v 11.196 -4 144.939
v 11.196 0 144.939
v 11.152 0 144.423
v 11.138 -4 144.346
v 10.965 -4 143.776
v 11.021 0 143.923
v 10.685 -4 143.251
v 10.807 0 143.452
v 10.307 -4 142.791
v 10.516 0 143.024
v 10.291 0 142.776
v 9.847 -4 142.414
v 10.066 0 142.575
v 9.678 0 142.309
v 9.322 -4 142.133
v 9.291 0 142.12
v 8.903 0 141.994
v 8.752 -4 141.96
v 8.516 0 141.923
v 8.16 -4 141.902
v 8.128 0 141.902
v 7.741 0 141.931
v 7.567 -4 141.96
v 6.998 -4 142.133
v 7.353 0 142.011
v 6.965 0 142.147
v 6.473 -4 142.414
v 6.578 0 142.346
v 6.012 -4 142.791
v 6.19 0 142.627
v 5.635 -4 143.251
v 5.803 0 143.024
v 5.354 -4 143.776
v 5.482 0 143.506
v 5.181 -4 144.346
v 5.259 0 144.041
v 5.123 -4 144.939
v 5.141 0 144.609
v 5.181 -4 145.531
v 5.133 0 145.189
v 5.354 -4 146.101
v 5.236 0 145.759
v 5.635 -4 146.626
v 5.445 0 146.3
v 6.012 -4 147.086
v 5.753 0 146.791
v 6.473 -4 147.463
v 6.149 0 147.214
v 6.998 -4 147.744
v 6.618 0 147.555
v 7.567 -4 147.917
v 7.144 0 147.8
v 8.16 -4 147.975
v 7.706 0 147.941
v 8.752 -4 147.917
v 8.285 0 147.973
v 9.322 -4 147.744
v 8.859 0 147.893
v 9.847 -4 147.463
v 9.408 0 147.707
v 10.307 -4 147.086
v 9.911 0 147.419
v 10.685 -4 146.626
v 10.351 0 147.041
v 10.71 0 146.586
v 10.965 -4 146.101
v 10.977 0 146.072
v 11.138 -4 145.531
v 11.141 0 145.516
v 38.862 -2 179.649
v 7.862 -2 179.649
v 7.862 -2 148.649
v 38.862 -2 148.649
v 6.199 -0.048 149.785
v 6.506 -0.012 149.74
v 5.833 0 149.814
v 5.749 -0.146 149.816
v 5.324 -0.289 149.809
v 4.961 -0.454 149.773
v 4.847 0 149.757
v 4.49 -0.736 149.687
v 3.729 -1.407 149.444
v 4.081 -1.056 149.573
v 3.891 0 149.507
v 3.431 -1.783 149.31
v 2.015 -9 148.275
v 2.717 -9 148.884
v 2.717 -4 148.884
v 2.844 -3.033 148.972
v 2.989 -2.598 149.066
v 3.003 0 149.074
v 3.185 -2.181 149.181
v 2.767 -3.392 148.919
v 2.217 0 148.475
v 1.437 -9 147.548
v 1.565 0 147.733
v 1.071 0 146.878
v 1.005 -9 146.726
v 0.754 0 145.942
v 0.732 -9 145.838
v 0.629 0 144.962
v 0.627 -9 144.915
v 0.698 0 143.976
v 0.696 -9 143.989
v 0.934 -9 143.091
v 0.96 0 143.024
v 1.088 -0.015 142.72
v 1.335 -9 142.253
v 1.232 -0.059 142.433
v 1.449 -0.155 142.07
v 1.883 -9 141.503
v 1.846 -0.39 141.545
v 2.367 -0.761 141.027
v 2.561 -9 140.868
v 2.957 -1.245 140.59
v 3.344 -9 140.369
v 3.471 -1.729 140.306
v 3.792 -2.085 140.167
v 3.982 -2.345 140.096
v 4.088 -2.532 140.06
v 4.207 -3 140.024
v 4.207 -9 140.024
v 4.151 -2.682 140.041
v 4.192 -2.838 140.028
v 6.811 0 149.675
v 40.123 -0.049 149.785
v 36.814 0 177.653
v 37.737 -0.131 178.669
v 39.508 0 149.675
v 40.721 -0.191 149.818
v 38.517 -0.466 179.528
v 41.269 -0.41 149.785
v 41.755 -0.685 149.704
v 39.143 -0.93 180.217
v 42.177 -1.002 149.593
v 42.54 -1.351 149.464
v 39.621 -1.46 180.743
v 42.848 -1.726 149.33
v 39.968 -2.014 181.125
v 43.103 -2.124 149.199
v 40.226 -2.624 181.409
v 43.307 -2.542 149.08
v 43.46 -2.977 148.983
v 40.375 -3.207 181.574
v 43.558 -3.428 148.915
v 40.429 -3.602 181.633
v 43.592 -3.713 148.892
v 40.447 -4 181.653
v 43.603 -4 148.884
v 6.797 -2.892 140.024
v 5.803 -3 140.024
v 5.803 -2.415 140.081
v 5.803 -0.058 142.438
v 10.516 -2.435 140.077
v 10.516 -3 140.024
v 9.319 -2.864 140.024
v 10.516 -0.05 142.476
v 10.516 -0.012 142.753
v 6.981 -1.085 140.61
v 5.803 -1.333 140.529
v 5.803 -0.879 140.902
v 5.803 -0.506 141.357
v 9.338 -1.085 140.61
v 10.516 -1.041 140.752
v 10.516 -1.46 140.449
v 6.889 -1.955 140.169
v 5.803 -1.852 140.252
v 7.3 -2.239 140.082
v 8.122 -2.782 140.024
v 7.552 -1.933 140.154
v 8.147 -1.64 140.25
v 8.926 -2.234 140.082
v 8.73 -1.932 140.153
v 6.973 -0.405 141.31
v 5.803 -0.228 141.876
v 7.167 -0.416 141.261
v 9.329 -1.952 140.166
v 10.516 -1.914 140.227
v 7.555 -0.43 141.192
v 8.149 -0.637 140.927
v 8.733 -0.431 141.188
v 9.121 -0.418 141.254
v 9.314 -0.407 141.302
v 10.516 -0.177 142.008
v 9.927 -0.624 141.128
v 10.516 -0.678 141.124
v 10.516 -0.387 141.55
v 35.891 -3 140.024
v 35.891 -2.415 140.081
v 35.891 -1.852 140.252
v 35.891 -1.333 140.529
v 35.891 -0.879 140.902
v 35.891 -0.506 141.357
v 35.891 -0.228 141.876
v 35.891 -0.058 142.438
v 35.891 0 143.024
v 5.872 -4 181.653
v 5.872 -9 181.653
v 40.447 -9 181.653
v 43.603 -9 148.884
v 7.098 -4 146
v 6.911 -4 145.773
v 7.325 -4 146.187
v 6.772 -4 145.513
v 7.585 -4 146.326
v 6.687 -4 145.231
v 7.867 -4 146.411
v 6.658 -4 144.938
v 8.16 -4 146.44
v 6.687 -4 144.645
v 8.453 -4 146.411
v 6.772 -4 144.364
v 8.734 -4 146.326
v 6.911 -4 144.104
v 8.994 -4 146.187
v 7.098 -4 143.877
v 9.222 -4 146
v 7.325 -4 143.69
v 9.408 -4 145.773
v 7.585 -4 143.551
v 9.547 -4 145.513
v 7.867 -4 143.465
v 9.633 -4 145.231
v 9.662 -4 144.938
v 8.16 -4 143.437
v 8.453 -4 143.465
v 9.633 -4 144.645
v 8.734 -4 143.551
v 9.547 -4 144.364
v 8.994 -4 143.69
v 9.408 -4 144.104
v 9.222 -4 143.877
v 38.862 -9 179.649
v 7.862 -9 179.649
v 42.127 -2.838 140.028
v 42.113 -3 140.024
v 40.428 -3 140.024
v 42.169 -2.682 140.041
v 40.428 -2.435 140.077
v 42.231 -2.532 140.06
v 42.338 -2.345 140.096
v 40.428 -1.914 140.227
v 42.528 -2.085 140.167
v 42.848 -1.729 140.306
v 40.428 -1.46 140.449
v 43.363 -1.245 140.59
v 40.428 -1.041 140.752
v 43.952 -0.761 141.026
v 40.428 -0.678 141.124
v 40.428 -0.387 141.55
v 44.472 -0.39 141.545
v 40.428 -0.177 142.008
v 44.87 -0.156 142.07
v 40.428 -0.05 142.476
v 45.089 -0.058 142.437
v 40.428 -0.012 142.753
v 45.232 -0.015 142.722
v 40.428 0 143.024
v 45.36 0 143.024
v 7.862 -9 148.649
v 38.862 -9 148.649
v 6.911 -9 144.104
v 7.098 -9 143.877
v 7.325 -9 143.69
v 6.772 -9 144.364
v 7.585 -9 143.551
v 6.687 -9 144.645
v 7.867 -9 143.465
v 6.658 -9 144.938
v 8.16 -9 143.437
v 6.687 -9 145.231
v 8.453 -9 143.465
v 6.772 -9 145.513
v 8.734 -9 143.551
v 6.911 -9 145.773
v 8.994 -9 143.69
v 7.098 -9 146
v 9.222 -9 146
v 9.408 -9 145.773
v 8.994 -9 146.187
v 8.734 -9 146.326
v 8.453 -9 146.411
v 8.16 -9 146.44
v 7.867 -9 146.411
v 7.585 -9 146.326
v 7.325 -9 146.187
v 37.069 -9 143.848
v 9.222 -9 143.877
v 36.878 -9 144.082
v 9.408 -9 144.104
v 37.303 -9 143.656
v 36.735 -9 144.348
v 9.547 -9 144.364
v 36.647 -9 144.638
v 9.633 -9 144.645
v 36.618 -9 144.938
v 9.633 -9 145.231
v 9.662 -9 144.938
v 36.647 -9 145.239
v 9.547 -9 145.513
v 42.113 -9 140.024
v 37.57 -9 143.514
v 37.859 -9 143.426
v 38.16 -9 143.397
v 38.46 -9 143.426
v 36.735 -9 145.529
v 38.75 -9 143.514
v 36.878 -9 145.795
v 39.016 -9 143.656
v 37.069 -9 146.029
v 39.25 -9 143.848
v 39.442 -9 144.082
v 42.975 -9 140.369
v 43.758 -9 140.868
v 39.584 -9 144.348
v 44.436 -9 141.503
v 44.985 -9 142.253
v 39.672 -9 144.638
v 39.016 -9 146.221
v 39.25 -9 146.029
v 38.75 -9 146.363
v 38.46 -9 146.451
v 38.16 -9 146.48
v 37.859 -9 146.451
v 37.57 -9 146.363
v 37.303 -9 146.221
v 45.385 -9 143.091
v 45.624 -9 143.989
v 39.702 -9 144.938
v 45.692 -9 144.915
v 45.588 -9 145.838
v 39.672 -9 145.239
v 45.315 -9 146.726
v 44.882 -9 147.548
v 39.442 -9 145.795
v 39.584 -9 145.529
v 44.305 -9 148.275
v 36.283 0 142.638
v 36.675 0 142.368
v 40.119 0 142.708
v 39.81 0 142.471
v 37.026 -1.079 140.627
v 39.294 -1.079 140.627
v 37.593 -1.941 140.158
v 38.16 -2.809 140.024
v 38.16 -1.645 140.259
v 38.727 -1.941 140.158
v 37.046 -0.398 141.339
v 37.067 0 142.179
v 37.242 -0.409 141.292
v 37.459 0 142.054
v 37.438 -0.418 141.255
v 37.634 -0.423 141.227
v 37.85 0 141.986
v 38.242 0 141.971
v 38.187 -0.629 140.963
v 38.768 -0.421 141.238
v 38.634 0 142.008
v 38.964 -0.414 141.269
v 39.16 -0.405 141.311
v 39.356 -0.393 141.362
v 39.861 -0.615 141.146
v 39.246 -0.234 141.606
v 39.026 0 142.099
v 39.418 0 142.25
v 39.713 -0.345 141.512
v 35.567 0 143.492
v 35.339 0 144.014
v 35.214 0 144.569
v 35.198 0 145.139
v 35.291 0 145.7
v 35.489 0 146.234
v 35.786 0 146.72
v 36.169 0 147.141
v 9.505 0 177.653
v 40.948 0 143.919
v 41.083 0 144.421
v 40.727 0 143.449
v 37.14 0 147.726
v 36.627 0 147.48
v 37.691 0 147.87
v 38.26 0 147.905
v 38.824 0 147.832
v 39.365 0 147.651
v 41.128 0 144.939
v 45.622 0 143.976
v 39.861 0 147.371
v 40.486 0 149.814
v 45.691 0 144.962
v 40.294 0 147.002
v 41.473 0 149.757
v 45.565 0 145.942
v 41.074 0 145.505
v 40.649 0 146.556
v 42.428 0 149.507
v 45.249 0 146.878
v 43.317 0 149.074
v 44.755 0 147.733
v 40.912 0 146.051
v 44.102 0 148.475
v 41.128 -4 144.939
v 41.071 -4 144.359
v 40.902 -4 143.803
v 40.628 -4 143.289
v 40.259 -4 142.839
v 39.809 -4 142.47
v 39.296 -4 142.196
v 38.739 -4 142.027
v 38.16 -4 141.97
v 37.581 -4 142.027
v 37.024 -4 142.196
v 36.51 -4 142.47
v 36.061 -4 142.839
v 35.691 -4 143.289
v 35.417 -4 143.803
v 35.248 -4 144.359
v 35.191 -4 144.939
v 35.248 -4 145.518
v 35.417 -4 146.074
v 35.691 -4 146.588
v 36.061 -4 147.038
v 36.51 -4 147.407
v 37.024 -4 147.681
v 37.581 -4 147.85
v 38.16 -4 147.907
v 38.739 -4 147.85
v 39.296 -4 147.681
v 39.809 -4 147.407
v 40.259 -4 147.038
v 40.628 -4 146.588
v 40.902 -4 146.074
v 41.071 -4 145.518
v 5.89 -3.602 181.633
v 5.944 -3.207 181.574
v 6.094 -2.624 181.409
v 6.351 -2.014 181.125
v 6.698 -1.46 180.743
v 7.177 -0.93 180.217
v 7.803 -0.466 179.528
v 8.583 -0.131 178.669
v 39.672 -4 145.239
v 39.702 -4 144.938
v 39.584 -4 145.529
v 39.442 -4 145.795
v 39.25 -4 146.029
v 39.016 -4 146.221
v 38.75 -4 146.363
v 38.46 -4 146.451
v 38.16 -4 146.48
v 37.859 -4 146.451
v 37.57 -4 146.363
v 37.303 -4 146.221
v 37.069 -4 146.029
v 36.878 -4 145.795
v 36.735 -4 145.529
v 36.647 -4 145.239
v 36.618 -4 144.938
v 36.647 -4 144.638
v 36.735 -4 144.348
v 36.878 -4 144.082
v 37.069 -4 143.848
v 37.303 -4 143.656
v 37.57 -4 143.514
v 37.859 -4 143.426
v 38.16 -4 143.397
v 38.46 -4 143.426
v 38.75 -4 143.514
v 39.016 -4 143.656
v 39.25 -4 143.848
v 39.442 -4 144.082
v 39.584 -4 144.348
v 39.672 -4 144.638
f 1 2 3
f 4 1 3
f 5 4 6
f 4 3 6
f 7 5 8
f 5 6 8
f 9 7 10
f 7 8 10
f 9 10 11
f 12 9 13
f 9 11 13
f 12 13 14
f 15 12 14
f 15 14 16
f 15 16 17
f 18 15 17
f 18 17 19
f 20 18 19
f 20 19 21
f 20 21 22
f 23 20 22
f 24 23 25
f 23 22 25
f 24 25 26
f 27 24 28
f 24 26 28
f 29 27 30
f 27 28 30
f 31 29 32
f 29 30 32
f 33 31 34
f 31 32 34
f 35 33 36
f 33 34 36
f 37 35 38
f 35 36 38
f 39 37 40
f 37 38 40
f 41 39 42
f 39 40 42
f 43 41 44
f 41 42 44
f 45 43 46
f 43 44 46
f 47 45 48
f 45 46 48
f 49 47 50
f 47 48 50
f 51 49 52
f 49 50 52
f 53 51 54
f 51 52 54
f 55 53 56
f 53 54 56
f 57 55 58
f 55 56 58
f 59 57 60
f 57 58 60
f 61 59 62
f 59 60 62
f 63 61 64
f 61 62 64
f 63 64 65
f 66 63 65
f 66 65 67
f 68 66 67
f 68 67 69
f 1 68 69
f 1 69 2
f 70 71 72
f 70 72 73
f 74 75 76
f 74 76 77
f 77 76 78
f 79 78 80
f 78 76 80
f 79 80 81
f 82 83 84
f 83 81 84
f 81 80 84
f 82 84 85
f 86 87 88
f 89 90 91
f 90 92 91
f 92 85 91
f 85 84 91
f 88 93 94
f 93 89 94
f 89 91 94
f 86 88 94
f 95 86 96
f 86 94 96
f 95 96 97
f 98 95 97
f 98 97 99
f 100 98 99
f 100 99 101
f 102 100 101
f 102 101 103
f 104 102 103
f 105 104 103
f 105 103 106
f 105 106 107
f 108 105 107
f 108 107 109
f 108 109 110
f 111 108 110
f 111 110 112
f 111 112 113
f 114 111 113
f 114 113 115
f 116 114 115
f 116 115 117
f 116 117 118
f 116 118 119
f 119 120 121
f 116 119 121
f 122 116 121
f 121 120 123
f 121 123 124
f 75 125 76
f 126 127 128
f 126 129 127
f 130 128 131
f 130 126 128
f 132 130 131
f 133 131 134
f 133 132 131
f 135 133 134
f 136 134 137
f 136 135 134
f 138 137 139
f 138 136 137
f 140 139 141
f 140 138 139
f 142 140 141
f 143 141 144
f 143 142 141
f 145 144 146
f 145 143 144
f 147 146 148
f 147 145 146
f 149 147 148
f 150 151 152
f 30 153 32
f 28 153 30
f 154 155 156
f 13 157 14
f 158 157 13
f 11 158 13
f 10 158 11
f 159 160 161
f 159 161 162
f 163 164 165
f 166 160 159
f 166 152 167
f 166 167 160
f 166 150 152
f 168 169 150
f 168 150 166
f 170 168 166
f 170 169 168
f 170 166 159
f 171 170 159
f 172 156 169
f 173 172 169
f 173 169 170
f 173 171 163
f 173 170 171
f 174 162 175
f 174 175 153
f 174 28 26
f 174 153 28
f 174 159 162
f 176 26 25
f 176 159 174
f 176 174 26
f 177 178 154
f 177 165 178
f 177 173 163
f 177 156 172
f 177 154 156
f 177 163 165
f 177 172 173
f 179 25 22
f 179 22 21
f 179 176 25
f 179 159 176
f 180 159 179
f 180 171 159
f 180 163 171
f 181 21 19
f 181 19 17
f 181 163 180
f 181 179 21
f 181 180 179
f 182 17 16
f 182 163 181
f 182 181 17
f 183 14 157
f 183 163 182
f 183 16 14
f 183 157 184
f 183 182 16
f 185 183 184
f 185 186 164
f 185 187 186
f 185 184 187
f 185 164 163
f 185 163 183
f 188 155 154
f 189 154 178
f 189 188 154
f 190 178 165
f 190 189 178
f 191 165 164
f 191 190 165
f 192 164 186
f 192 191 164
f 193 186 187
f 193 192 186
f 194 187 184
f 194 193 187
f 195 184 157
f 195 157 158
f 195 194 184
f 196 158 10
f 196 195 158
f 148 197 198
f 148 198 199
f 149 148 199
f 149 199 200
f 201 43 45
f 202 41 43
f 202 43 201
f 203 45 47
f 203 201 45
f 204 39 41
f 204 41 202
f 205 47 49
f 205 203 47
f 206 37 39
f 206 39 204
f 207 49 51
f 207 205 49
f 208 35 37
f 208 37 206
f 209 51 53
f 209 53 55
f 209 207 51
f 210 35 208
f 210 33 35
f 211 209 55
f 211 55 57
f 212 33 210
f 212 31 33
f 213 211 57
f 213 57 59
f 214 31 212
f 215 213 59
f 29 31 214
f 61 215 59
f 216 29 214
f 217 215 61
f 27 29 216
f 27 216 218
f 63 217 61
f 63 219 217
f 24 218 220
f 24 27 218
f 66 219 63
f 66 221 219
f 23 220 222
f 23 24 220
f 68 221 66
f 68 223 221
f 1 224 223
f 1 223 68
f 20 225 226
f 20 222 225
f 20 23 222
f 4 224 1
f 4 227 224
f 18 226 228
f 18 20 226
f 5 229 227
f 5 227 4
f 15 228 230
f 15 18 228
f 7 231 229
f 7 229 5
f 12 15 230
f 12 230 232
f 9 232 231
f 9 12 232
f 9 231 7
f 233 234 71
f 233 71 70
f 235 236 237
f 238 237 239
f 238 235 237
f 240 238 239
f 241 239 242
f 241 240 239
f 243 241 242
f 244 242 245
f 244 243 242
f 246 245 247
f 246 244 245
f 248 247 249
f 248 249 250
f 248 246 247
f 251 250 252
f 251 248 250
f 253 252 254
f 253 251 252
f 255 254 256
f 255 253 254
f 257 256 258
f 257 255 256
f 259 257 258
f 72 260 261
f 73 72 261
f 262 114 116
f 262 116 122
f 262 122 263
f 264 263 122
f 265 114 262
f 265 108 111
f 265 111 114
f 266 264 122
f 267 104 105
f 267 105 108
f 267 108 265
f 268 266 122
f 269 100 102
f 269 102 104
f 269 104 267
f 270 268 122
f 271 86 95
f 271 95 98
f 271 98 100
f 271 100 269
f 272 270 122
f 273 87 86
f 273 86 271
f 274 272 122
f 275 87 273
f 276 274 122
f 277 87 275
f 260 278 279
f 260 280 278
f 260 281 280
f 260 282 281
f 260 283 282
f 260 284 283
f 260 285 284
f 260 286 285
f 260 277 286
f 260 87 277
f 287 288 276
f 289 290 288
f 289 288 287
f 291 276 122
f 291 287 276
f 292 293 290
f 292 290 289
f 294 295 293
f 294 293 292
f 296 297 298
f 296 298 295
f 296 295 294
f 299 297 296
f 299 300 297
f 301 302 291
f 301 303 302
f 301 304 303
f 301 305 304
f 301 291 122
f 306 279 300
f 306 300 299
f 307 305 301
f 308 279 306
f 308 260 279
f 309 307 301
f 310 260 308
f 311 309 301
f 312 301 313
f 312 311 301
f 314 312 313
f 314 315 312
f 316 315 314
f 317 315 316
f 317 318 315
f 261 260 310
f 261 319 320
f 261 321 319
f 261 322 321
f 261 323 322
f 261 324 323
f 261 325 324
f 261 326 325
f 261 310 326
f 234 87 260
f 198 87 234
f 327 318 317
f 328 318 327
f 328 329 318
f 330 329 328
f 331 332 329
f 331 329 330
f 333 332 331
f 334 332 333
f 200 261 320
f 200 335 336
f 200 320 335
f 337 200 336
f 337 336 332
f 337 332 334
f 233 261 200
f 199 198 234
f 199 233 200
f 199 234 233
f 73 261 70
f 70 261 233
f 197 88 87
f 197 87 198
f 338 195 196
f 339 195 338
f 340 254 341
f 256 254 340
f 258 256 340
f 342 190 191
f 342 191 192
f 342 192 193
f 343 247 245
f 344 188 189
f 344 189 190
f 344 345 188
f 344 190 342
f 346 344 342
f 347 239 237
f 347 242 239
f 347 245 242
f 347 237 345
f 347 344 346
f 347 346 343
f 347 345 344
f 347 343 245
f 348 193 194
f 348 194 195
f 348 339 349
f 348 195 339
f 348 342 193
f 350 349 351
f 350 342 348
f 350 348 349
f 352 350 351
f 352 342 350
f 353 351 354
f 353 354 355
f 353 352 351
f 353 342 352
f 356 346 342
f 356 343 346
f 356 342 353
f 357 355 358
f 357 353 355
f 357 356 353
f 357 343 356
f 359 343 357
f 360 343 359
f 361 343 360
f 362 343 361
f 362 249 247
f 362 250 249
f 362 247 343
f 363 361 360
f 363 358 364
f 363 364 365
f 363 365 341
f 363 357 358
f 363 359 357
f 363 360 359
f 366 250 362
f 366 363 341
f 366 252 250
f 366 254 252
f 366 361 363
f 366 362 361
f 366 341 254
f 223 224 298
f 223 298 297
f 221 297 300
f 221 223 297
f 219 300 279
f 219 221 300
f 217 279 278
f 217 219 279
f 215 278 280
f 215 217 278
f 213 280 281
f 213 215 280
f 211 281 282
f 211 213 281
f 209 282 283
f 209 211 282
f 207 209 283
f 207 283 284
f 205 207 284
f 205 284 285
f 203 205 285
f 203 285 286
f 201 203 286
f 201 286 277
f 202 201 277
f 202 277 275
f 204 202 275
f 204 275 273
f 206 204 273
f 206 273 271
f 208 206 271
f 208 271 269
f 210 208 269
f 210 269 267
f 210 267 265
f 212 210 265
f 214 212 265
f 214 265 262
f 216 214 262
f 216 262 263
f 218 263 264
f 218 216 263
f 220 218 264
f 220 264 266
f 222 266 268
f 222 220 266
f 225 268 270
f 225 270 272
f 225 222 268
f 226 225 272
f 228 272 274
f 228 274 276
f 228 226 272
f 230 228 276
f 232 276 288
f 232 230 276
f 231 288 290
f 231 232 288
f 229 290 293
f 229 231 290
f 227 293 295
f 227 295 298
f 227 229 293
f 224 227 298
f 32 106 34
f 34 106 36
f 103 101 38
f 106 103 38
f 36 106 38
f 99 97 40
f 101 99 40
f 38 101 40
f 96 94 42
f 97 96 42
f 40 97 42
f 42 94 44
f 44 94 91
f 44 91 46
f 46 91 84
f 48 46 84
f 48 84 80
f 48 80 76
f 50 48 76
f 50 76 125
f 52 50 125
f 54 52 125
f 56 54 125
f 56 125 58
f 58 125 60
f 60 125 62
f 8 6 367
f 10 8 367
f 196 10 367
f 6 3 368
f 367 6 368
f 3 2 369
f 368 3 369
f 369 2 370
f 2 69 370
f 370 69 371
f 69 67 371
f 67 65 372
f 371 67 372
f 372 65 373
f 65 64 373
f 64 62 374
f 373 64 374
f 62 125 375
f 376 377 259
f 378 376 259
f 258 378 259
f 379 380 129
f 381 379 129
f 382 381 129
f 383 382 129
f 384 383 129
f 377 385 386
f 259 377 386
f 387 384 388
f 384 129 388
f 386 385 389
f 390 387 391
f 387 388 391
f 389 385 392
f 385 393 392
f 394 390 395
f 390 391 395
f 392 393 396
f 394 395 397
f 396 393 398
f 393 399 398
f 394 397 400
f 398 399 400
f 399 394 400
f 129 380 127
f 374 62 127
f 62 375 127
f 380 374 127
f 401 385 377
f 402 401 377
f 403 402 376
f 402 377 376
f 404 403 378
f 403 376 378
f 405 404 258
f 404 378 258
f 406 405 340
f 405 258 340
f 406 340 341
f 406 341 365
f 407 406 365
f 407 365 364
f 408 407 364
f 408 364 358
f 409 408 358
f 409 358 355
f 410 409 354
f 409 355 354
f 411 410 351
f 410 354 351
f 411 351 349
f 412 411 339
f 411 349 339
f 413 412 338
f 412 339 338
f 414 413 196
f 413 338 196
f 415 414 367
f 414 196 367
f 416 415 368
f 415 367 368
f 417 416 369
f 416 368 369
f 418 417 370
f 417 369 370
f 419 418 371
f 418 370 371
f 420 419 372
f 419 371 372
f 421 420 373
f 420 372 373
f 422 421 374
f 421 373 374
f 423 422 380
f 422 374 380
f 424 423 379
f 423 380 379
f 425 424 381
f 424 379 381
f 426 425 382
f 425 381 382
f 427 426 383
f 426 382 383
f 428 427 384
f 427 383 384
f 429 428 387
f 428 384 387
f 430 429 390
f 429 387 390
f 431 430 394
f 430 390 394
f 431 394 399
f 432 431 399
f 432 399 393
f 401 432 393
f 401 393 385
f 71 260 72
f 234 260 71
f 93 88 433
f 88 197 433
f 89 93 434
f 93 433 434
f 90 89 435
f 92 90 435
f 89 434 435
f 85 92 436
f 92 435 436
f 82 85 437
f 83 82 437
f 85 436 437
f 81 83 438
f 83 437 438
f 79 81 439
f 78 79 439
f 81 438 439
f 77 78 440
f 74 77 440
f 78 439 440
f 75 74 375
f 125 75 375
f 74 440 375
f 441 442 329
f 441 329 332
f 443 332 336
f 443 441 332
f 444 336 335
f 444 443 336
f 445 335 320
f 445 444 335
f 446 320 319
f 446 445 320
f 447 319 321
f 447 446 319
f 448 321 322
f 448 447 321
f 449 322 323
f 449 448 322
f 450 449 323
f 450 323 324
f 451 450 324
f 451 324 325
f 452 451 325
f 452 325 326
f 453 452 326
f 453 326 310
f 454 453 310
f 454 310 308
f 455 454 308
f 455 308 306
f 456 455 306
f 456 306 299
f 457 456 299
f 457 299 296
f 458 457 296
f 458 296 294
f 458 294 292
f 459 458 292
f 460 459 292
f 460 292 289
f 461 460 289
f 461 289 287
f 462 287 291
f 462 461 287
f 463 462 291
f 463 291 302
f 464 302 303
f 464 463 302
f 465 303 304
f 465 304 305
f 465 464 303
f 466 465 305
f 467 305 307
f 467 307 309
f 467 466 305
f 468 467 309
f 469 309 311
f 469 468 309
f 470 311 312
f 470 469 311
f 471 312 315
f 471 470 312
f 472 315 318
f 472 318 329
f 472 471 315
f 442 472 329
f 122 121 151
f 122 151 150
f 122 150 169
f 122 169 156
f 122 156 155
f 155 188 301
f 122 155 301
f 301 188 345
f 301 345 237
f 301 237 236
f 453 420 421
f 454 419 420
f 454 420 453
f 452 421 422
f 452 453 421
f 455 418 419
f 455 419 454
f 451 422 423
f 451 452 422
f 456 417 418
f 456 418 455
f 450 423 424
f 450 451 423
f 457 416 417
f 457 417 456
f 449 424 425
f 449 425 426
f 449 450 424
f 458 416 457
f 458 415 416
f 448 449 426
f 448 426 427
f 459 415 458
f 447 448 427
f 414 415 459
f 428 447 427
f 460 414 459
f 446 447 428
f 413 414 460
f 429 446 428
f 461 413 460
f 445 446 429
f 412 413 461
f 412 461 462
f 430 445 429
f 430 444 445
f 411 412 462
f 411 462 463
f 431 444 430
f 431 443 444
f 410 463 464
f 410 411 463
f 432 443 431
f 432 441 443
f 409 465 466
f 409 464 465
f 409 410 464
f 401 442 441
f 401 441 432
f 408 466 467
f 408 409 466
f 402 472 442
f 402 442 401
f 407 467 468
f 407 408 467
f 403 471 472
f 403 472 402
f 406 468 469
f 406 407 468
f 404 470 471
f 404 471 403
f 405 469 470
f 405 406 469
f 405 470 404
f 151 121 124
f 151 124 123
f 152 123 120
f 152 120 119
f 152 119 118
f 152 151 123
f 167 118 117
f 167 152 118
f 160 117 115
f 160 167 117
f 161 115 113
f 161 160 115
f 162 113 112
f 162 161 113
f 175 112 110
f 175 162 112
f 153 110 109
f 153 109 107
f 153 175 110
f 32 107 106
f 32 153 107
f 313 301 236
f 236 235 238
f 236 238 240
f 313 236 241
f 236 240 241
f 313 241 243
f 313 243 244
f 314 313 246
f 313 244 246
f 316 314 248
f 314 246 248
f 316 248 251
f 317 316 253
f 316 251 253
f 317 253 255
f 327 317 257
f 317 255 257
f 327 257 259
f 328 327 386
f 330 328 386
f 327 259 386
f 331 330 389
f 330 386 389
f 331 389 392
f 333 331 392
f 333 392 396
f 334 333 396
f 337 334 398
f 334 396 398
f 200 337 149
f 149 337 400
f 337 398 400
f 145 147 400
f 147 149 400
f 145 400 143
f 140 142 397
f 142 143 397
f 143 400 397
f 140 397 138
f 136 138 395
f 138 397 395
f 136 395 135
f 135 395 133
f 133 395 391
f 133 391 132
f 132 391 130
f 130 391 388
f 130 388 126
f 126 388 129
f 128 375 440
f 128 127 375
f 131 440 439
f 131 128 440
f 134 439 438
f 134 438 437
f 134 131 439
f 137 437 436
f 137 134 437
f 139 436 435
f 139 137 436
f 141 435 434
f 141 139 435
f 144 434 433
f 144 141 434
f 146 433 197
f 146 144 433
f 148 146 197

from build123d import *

# Parameters (mm, degrees)
SKETCH_R        = 1.501869
SKETCH_R_2      = 1.541907
PAD_DEPTH       = 9
SKETCH003_W     = 31
SKETCH003_H     = 31
POCKET_DEPTH    = 7
FILLET_R        = 4
SKETCH004_R     = 2.968472
SKETCH004_R_2   = 3.036595
POCKET001_DEPTH = 4
FILLET001_R     = 3


with BuildPart() as part:
    # Sketch → Pad (new body)
    with BuildSketch(Plane.XZ):
        with BuildLine():
            ThreePointArc((2.716597, 148.883863), (0.695773, 143.988618), (4.206694, 140.023699))
            Line((4.206694, 140.023699), (42.11266, 140.023699))
            ThreePointArc((42.11266, 140.023699), (45.623581, 143.988618), (43.602757, 148.883863))
            Line((40.447369, 181.653), (43.602757, 148.883863))
            Line((5.871985, 181.653), (40.447369, 181.653))
            Line((2.716597, 148.883863), (5.871985, 181.653))
        make_face()
        with Locations((8.159677, 144.938485)):
            Circle(SKETCH_R, mode=Mode.SUBTRACT)
        with Locations((38.159677, 144.938485)):
            Circle(SKETCH_R_2, mode=Mode.SUBTRACT)
    extrude(amount=PAD_DEPTH)

    # Sketch003 (on Face10 of Pad) → Pocket (cut)
    with BuildSketch(Plane.XZ.offset(9)):
        with Locations((23.362282, 164.148895)):
            Rectangle(SKETCH003_W, SKETCH003_H)
    extrude(amount=-POCKET_DEPTH, mode=Mode.SUBTRACT)

    # Fillet
    fillet_edges = [part.edges().sort_by_distance(p)[0] for p in [
        (42.025063, 0, 165.268432),
        (23.159677, 0, 181.653),
        (4.294291, 0, 165.268432),
    ]]
    fillet(fillet_edges, radius=FILLET_R)

    # Sketch004 (on Face5 of Fillet) → Pocket001 (cut)
    with BuildSketch(Plane(origin=(0, 0, 0), x_dir=(1, 0, 0), z_dir=(0, 1, 0))):
        with Locations((38.159676, -144.938507)):
            Circle(SKETCH004_R)
        with Locations((8.159677, -144.938507)):
            Circle(SKETCH004_R_2)
    extrude(amount=-POCKET001_DEPTH, mode=Mode.SUBTRACT)

    # Fillet001
    fillet001_edges = [part.edges().sort_by_distance(p)[0] for p in [
        (23.159677, 0, 140.023699),
    ]]
    fillet(fillet001_edges, radius=FILLET001_R)


solid = part.part
